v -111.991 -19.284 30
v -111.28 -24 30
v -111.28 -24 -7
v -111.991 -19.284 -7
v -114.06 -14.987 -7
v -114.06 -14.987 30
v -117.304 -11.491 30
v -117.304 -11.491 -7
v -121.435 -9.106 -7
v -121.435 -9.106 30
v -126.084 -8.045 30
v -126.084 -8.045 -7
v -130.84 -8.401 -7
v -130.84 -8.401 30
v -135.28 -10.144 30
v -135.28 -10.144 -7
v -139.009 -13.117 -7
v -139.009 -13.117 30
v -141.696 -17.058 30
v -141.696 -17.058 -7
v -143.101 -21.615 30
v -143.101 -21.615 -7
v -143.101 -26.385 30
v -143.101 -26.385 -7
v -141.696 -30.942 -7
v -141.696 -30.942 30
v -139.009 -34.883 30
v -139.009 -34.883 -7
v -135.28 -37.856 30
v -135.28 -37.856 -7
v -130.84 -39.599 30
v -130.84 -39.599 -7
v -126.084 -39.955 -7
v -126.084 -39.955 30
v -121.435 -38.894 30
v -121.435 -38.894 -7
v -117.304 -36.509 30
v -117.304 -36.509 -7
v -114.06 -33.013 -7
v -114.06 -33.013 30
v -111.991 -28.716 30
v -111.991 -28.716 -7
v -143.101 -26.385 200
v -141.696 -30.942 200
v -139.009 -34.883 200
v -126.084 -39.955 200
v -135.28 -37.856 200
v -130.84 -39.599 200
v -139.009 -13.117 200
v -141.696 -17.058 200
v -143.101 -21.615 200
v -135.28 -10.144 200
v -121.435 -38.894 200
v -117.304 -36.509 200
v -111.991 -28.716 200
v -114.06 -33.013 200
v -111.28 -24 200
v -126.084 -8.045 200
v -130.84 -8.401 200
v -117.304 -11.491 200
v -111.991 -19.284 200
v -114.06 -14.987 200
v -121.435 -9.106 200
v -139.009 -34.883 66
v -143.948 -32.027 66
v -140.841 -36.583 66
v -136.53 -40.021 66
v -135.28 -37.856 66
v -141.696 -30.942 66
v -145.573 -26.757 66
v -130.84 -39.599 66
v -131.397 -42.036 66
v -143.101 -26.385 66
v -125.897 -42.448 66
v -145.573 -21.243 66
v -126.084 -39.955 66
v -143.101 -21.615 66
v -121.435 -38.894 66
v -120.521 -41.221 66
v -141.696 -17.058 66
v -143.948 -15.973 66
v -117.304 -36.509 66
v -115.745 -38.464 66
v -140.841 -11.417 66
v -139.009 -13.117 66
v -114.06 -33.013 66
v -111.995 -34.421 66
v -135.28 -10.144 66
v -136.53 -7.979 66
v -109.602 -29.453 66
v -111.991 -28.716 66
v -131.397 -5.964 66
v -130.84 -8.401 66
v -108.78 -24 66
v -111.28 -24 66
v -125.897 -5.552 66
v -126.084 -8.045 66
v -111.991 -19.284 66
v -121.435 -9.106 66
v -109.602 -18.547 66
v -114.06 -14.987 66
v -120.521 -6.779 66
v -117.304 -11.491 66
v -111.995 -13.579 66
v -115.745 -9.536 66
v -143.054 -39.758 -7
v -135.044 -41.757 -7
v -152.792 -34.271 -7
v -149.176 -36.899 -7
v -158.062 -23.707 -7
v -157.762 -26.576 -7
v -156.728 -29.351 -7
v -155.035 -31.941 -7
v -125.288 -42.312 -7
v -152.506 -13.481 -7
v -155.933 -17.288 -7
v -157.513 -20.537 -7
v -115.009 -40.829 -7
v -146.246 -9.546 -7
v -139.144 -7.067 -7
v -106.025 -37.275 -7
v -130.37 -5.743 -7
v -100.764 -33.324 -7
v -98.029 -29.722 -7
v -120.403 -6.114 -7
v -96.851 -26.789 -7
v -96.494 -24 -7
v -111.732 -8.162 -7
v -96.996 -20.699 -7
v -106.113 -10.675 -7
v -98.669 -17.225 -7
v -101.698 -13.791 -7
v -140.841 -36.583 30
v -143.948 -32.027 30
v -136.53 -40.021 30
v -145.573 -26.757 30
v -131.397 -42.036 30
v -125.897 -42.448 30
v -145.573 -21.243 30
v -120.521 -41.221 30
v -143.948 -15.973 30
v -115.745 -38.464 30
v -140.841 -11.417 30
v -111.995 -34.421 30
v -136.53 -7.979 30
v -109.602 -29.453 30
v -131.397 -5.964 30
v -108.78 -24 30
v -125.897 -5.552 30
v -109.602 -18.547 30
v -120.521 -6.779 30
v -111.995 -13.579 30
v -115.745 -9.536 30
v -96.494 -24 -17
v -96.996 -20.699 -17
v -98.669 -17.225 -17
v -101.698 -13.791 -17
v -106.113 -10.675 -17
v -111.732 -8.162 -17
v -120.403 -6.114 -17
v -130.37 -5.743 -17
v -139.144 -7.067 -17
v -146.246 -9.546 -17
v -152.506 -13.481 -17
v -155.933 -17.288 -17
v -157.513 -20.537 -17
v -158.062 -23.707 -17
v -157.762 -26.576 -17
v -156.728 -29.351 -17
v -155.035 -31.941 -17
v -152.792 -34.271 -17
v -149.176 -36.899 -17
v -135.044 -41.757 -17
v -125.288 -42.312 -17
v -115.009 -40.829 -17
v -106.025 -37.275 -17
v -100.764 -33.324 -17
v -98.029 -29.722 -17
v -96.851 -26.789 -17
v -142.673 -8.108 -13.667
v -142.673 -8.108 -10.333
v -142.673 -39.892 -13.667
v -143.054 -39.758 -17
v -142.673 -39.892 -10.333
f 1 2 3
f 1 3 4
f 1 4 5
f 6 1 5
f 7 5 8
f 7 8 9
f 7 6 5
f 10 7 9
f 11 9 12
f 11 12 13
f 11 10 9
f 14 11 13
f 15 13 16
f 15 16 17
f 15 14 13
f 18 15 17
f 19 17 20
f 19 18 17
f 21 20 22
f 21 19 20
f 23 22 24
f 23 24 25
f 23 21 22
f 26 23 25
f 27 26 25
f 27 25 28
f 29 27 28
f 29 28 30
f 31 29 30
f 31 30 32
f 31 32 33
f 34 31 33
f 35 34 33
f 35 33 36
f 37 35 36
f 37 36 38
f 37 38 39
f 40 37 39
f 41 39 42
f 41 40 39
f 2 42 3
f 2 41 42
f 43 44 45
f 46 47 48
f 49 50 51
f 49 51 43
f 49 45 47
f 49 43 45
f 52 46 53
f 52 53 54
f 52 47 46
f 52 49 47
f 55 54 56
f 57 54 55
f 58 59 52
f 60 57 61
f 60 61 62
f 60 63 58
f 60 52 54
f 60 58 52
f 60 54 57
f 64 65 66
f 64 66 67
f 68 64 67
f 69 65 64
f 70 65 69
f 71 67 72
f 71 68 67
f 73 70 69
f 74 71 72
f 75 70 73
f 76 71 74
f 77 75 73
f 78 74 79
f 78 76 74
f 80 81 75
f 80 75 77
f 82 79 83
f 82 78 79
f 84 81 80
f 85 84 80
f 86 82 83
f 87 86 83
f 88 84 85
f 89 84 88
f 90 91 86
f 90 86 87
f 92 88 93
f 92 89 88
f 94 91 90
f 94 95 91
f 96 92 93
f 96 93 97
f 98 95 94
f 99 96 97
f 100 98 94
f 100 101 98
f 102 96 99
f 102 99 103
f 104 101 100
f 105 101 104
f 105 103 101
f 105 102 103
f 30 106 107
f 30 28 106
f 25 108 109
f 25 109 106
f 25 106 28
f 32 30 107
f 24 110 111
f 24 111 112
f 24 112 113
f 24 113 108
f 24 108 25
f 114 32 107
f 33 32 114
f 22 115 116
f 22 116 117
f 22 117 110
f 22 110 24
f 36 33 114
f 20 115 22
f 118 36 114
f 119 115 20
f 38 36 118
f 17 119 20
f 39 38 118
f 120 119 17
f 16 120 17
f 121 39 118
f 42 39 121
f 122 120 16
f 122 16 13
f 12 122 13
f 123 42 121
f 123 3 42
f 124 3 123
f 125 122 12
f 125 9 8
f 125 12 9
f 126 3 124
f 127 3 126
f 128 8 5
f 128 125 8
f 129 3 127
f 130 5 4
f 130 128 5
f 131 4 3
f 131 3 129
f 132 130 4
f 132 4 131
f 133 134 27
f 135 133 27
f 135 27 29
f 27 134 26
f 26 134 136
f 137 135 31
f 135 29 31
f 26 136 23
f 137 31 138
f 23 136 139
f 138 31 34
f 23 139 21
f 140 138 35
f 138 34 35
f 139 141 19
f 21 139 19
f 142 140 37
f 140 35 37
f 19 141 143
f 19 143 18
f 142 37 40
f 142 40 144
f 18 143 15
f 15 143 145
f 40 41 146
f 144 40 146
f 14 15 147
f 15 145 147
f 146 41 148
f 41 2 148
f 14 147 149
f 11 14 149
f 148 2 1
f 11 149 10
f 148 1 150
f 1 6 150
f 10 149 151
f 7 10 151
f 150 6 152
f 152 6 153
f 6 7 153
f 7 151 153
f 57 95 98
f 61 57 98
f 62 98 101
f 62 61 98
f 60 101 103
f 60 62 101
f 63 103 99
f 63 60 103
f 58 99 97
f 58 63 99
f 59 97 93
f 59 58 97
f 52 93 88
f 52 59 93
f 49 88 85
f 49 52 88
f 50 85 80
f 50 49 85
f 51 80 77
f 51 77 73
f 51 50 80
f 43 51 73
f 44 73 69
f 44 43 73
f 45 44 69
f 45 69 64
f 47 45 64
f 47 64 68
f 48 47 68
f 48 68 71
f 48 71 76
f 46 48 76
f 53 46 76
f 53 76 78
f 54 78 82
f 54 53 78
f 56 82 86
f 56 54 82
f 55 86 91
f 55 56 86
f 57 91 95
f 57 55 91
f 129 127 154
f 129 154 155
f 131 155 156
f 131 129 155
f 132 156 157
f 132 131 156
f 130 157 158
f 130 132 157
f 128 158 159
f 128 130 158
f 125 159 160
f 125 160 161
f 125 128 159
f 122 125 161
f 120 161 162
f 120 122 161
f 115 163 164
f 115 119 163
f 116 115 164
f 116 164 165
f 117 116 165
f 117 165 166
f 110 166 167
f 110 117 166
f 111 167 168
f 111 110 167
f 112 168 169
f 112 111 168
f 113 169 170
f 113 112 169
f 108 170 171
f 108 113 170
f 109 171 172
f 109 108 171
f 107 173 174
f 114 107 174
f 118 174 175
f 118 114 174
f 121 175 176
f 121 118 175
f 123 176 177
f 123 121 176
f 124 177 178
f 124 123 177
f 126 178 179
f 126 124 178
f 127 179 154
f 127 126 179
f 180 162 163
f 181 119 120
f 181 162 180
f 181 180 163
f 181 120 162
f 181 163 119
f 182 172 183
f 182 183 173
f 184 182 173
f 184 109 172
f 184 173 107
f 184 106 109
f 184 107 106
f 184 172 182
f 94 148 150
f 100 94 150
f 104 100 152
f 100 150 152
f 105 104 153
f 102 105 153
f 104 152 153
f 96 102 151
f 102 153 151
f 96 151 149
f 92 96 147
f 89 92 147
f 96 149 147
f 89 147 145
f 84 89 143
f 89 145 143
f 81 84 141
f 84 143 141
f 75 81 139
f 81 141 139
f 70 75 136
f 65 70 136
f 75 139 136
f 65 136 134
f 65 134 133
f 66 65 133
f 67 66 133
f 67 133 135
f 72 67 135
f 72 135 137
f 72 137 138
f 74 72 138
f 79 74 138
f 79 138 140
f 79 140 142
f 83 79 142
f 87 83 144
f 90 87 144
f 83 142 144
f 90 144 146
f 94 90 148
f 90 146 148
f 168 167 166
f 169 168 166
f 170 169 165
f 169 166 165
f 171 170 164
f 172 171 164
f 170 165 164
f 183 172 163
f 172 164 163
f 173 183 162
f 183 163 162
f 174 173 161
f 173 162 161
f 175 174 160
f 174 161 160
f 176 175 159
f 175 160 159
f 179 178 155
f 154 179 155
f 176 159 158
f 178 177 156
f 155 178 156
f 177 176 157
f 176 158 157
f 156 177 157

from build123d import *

# Parameters (mm, degrees)
SKETCH021_R       = 16
PAD014_DEPTH      = 200
PAD014_DEPTH_BACK = 10
PAD015_DEPTH      = 10
SKETCH023_R       = 18.5
PAD016_DEPTH      = 36


with BuildPart() as part:
    # Sketch021 → Pad014 (new body, two sides)
    with BuildSketch(Plane.XY) as pad014_sk:
        Circle(SKETCH021_R)
    extrude(amount=PAD014_DEPTH)
    extrude(pad014_sk.sketch, amount=-PAD014_DEPTH_BACK)

    # Sketch022 → Pad015 (join)
    with BuildSketch(Plane.XY.offset(-7)):
        with BuildLine():
            add(Edge.make_bspline(
                [(30.7863752332, 0), (30.7863752332, 31.7831323189), (-15.3931876166, 15.8915661594), (-61.5727504664, 0), (-15.3931876166, -15.8915661594), (30.7863752332, -31.7831323189), (30.7863752332, 0)],
                knots=[0, 0, 0, 2.0943951024, 2.0943951024, 4.1887902048, 4.1887902048, 6.2831853072, 6.2831853072, 6.2831853072], degree=2, weights=[1, 0.5, 1, 0.5, 1, 0.5, 1]))
        make_face()
    extrude(amount=-PAD015_DEPTH)

    # Sketch023 → Pad016 (join)
    with BuildSketch(Plane.XY.offset(30)):
        Circle(SKETCH023_R)
    extrude(amount=PAD016_DEPTH)


with BuildPart() as part_1:
    # Body004 placement: moved
    add(part.part.moved(Location((-127.28, -24, 0))))


solid = part_1.part
